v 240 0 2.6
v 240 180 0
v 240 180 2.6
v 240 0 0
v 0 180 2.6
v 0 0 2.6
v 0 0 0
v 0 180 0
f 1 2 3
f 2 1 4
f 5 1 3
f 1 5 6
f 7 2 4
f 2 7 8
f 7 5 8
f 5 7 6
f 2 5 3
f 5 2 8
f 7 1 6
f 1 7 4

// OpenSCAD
// Parametric camera-calibration checkerboard, v1.0
// Units: mm. Both colours have the SAME top plane.
// Export white and black separately, then import as ONE multi-part object.

/* [01 Grid - 行列数] */
// squares = actual squares; inner_corners = internal intersections
count_mode = "squares"; // [squares:格子数, inner_corners:内角点数]
// Horizontal count - 横向数量
columns = 10; // [2:1:60]
// Vertical count - 纵向数量
rows = 7; // [2:1:60]

/* [02 Size - 尺寸 mm] */
// square = fixed square size; outer = fit into exact outer dimensions
size_mode = "square"; // [square:按单格边长, outer:按整板宽高]
// Used in square mode - 单格边长
square_size = 20; // [2:0.1:100]
// Minimum white border on each side - 四周最小白边
border = 20; // [0.1:0.1:100]
// Used in outer mode; squares stay square, extra space becomes white border
outer_width = 240; // [10:0.1:1000]
outer_height = 180; // [10:0.1:1000]

/* [03 Thickness - 厚度 mm] */
// Continuous white backing - 连续底板厚度
base_thickness = 2; // [0.4:0.1:20]
// Black inlay depth; white squares remain flush - 黑格嵌入深度
pattern_thickness = 0.6; // [0.2:0.1:5]
// Internal taper below the top face; does NOT change the visible square size
inlay_taper = 0.05; // [0.01:0.01:0.5]
// Tiny corner chamfer avoids touching STL shells. 0 = ideal sharp corners, may cause mesh warnings.
corner_relief = 0.02; // [0:0.01:0.2]

/* [04 Export - 导出选择] */
// preview = colour preview; white/black = printable material parts
export_part = "preview"; // [preview:黑白预览, white:白色底板与白格, black:黑色格子, solid:整板实体]
// Black square at lower-left in XY coordinates
black_at_origin = true;

/* [Hidden] */
nx = columns + (count_mode == "inner_corners" ? 1 : 0);
ny = rows + (count_mode == "inner_corners" ? 1 : 0);
s = size_mode == "square" ? square_size : min((outer_width-2*border)/nx, (outer_height-2*border)/ny);
w = size_mode == "square" ? nx*s+2*border : outer_width;
h = size_mode == "square" ? ny*s+2*border : outer_height;
mx = (w-nx*s)/2;
my = (h-ny*s)/2;
z_top = base_thickness + pattern_thickness;
eps = 0.01;

assert(count_mode == "squares" || count_mode == "inner_corners", "Invalid count_mode");
assert(size_mode == "square" || size_mode == "outer", "Invalid size_mode");
assert(columns >= 2 && rows >= 2 && floor(columns)==columns && floor(rows)==rows, "Counts must be integers >= 2");
assert(nx <= 61 && ny <= 61, "Maximum actual grid: 61 x 61");
assert(border > 0 && s > 0, "Board is too small for its white border");
assert(base_thickness > 0 && pattern_thickness > 0, "Thickness must be positive");
assert(inlay_taper > 0 && 2*inlay_taper < s, "Inlay taper must be smaller than half a square");
assert(corner_relief >= 0 && corner_relief < s/4, "Corner relief must be smaller than a quarter square");
assert(export_part == "preview" || export_part == "white" || export_part == "black" || export_part == "solid", "Invalid export_part");

echo(str("Squares: ",nx," x ",ny,"; inner corners: ",nx-1," x ",ny-1));
echo(str("Square = ",s," mm; board = ",w," x ",h," x ",z_top," mm"));
echo(str("White margins X/Y = ",mx," / ",my," mm"));

function is_black(c,r) = ((c+r)%2 == (black_at_origin ? 0 : 1));

module tile_profile() {
    q = corner_relief;
    if(q == 0) square([s,s],center=true);
    else translate([-s/2,-s/2])
        polygon([[q,0],[s-q,0],[s,q],[s,s-q],[s-q,s],[q,s],[0,s-q],[0,q]]);
}

// Straight top edges lie on exact grid lines. Only the tiny corner chamfers
// depart from an ideal mathematical checkerboard; see the Chinese guide.
module tile(c,r,cut=false) {
    translate([mx+(c+0.5)*s,my+(r+0.5)*s,base_thickness])
        union() {
            linear_extrude(height=pattern_thickness,scale=s/(s-2*inlay_taper),convexity=4)
                scale((s-2*inlay_taper)/s) tile_profile();
            if(cut)
                translate([0,0,pattern_thickness])
                    linear_extrude(height=eps) tile_profile();
        }
}

module black_part() {
    for(r=[0:ny-1]) for(c=[0:nx-1])
        if(is_black(c,r)) tile(c,r);
}

module white_part() {
    difference() {
        cube([w,h,z_top]);
        for(r=[0:ny-1]) for(c=[0:nx-1])
            if(is_black(c,r)) tile(c,r,true);
    }
}

if(export_part == "white") white_part();
else if(export_part == "black") black_part();
else if(export_part == "solid") cube([w,h,z_top]);
else {
    color([0.93,0.93,0.90]) white_part();
    color([0.04,0.04,0.04]) black_part();
}
